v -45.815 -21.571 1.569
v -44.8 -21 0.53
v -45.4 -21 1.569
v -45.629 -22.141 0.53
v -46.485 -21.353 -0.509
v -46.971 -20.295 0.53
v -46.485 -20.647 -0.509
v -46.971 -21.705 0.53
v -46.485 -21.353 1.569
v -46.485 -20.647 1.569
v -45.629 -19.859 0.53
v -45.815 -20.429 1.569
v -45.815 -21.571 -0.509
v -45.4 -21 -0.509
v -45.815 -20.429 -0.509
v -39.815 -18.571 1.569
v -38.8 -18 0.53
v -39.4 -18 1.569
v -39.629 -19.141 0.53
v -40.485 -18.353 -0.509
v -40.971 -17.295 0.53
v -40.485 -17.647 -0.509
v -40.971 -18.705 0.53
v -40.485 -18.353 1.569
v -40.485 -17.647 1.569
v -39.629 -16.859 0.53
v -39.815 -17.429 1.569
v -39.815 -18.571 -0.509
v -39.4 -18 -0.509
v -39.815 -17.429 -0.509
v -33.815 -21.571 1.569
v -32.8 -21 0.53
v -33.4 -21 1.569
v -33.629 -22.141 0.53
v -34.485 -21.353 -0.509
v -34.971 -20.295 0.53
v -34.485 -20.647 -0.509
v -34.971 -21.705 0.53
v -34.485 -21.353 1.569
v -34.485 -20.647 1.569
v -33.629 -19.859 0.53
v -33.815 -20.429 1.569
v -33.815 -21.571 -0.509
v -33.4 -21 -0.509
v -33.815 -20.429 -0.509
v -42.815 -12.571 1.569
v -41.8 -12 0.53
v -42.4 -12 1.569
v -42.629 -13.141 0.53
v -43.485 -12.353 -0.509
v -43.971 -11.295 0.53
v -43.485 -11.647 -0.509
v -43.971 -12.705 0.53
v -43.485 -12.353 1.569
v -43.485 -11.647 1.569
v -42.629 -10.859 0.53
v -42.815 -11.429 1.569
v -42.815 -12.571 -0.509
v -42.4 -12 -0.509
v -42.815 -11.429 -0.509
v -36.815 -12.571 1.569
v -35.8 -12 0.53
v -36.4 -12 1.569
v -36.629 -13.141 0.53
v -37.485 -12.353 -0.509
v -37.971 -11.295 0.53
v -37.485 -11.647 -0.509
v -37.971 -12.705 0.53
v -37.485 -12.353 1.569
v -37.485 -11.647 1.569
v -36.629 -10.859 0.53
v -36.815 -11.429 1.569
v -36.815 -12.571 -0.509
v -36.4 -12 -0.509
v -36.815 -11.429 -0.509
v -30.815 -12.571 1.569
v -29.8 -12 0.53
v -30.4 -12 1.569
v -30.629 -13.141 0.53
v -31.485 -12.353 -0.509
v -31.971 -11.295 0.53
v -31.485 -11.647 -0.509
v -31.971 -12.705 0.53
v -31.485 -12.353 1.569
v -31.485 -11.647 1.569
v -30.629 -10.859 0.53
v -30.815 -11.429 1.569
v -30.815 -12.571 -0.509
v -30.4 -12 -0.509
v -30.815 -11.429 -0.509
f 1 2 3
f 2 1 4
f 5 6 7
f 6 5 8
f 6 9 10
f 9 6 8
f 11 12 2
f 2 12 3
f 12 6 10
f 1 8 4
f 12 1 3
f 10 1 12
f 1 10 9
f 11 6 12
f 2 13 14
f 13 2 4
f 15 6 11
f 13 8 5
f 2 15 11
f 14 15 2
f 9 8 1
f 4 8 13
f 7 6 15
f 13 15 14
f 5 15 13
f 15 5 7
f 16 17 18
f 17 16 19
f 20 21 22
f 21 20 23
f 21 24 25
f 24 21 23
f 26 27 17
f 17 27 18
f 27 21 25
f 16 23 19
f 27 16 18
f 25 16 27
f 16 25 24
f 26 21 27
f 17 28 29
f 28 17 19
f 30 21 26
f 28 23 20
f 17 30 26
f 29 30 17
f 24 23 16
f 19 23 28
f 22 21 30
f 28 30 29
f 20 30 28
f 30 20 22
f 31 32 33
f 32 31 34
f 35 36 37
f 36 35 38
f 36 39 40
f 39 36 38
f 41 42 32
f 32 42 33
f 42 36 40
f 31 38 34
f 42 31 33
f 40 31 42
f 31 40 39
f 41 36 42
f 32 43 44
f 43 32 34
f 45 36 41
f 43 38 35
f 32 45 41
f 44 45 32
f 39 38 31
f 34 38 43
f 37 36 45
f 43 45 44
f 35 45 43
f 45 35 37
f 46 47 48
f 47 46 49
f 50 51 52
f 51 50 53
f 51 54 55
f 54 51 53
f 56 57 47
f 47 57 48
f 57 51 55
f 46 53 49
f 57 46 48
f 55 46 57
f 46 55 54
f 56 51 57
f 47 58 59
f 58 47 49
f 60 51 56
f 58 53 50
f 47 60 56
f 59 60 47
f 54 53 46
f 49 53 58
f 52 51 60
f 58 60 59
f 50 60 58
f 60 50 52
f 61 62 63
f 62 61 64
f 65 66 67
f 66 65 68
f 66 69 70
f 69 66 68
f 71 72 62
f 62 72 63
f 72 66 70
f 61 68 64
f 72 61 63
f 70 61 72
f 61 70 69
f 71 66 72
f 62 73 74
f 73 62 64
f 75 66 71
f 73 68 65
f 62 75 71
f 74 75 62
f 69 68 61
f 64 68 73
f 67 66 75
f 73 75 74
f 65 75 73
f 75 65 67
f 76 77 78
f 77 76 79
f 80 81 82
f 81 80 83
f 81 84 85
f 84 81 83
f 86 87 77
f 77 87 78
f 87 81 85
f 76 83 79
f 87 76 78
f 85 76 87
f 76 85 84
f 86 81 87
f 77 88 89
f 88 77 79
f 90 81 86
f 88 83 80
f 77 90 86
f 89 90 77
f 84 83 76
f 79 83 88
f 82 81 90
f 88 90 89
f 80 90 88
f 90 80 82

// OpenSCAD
// Parameters
tape_length = 100; //[50:200:1]
tape_width = 50; //[25:100:1]
tape_thickness = 0.08; //[0.04:0.2:0.01]
corner_radius = 2; //[1:6:0.5]
edge_chamfer = 0.3; //[0.1:1:0.05]
texture_depth = 0.01; //[0.005:0.03:0.001]
texture_pitch = 6; //[3:12:0.5]
texture_bump_radius = 1.2; //[0.6:2.5:0.1]
texture_margin = 4; //[2:10:0.5]
overlap = 0.5; //[0.2:2:0.1]

// Base shapes
module tape_sheet() {
  cube([tape_length, tape_width, tape_thickness], center=true);
}

module rounded_corners() {
  linear_extrude(height=tape_thickness, center=true) {
    polygon(points=[
      [-tape_length/2 + corner_radius, -tape_width/2],
      [tape_length/2 - corner_radius, -tape_width/2],
      [tape_length/2, -tape_width/2 + corner_radius],
      [tape_length/2, tape_width/2 - corner_radius],
      [tape_length/2 - corner_radius, tape_width/2],
      [-tape_length/2 + corner_radius, tape_width/2],
      [-tape_length/2, tape_width/2 - corner_radius],
      [-tape_length/2, -tape_width/2 + corner_radius]
    ]);
  }
}

module edge_chamfer() {
  cube([tape_length + 2*edge_chamfer, tape_width + 2*edge_chamfer, tape_thickness + 2*edge_chamfer], center=true);
}

module surface_texture_bump(pos_x, pos_y) {
  translate([pos_x, pos_y, tape_thickness/2 - texture_depth + overlap])
    sphere(r=texture_bump_radius, center=true);
}

// Operations
module tape_thickness() {
  intersection() {
    tape_sheet();
    rounded_corners();
  }
}

module surface_texture() {
  union() {
    surface_texture_bump(-tape_length/2 + texture_margin + texture_pitch*0, -tape_width/2 + texture_margin + texture_pitch*0);
    surface_texture_bump(-tape_length/2 + texture_margin + texture_pitch*1, -tape_width/2 + texture_margin + texture_pitch*0.5);
    surface_texture_bump(-tape_length/2 + texture_margin + texture_pitch*2, -tape_width/2 + texture_margin + texture_pitch*0);
    surface_texture_bump(-tape_length/2 + texture_margin + texture_pitch*0.5, -tape_width/2 + texture_margin + texture_pitch*1.5);
    surface_texture_bump(-tape_length/2 + texture_margin + texture_pitch*1.5, -tape_width/2 + texture_margin + texture_pitch*1.5);
    surface_texture_bump(-tape_length/2 + texture_margin + texture_pitch*2.5, -tape_width/2 + texture_margin + texture_pitch*1.5);
  }
}

// Final output
color("Silver") {
  union() {
    difference() {
      tape_thickness();
      edge_chamfer();
    }
    surface_texture();
  }
}
